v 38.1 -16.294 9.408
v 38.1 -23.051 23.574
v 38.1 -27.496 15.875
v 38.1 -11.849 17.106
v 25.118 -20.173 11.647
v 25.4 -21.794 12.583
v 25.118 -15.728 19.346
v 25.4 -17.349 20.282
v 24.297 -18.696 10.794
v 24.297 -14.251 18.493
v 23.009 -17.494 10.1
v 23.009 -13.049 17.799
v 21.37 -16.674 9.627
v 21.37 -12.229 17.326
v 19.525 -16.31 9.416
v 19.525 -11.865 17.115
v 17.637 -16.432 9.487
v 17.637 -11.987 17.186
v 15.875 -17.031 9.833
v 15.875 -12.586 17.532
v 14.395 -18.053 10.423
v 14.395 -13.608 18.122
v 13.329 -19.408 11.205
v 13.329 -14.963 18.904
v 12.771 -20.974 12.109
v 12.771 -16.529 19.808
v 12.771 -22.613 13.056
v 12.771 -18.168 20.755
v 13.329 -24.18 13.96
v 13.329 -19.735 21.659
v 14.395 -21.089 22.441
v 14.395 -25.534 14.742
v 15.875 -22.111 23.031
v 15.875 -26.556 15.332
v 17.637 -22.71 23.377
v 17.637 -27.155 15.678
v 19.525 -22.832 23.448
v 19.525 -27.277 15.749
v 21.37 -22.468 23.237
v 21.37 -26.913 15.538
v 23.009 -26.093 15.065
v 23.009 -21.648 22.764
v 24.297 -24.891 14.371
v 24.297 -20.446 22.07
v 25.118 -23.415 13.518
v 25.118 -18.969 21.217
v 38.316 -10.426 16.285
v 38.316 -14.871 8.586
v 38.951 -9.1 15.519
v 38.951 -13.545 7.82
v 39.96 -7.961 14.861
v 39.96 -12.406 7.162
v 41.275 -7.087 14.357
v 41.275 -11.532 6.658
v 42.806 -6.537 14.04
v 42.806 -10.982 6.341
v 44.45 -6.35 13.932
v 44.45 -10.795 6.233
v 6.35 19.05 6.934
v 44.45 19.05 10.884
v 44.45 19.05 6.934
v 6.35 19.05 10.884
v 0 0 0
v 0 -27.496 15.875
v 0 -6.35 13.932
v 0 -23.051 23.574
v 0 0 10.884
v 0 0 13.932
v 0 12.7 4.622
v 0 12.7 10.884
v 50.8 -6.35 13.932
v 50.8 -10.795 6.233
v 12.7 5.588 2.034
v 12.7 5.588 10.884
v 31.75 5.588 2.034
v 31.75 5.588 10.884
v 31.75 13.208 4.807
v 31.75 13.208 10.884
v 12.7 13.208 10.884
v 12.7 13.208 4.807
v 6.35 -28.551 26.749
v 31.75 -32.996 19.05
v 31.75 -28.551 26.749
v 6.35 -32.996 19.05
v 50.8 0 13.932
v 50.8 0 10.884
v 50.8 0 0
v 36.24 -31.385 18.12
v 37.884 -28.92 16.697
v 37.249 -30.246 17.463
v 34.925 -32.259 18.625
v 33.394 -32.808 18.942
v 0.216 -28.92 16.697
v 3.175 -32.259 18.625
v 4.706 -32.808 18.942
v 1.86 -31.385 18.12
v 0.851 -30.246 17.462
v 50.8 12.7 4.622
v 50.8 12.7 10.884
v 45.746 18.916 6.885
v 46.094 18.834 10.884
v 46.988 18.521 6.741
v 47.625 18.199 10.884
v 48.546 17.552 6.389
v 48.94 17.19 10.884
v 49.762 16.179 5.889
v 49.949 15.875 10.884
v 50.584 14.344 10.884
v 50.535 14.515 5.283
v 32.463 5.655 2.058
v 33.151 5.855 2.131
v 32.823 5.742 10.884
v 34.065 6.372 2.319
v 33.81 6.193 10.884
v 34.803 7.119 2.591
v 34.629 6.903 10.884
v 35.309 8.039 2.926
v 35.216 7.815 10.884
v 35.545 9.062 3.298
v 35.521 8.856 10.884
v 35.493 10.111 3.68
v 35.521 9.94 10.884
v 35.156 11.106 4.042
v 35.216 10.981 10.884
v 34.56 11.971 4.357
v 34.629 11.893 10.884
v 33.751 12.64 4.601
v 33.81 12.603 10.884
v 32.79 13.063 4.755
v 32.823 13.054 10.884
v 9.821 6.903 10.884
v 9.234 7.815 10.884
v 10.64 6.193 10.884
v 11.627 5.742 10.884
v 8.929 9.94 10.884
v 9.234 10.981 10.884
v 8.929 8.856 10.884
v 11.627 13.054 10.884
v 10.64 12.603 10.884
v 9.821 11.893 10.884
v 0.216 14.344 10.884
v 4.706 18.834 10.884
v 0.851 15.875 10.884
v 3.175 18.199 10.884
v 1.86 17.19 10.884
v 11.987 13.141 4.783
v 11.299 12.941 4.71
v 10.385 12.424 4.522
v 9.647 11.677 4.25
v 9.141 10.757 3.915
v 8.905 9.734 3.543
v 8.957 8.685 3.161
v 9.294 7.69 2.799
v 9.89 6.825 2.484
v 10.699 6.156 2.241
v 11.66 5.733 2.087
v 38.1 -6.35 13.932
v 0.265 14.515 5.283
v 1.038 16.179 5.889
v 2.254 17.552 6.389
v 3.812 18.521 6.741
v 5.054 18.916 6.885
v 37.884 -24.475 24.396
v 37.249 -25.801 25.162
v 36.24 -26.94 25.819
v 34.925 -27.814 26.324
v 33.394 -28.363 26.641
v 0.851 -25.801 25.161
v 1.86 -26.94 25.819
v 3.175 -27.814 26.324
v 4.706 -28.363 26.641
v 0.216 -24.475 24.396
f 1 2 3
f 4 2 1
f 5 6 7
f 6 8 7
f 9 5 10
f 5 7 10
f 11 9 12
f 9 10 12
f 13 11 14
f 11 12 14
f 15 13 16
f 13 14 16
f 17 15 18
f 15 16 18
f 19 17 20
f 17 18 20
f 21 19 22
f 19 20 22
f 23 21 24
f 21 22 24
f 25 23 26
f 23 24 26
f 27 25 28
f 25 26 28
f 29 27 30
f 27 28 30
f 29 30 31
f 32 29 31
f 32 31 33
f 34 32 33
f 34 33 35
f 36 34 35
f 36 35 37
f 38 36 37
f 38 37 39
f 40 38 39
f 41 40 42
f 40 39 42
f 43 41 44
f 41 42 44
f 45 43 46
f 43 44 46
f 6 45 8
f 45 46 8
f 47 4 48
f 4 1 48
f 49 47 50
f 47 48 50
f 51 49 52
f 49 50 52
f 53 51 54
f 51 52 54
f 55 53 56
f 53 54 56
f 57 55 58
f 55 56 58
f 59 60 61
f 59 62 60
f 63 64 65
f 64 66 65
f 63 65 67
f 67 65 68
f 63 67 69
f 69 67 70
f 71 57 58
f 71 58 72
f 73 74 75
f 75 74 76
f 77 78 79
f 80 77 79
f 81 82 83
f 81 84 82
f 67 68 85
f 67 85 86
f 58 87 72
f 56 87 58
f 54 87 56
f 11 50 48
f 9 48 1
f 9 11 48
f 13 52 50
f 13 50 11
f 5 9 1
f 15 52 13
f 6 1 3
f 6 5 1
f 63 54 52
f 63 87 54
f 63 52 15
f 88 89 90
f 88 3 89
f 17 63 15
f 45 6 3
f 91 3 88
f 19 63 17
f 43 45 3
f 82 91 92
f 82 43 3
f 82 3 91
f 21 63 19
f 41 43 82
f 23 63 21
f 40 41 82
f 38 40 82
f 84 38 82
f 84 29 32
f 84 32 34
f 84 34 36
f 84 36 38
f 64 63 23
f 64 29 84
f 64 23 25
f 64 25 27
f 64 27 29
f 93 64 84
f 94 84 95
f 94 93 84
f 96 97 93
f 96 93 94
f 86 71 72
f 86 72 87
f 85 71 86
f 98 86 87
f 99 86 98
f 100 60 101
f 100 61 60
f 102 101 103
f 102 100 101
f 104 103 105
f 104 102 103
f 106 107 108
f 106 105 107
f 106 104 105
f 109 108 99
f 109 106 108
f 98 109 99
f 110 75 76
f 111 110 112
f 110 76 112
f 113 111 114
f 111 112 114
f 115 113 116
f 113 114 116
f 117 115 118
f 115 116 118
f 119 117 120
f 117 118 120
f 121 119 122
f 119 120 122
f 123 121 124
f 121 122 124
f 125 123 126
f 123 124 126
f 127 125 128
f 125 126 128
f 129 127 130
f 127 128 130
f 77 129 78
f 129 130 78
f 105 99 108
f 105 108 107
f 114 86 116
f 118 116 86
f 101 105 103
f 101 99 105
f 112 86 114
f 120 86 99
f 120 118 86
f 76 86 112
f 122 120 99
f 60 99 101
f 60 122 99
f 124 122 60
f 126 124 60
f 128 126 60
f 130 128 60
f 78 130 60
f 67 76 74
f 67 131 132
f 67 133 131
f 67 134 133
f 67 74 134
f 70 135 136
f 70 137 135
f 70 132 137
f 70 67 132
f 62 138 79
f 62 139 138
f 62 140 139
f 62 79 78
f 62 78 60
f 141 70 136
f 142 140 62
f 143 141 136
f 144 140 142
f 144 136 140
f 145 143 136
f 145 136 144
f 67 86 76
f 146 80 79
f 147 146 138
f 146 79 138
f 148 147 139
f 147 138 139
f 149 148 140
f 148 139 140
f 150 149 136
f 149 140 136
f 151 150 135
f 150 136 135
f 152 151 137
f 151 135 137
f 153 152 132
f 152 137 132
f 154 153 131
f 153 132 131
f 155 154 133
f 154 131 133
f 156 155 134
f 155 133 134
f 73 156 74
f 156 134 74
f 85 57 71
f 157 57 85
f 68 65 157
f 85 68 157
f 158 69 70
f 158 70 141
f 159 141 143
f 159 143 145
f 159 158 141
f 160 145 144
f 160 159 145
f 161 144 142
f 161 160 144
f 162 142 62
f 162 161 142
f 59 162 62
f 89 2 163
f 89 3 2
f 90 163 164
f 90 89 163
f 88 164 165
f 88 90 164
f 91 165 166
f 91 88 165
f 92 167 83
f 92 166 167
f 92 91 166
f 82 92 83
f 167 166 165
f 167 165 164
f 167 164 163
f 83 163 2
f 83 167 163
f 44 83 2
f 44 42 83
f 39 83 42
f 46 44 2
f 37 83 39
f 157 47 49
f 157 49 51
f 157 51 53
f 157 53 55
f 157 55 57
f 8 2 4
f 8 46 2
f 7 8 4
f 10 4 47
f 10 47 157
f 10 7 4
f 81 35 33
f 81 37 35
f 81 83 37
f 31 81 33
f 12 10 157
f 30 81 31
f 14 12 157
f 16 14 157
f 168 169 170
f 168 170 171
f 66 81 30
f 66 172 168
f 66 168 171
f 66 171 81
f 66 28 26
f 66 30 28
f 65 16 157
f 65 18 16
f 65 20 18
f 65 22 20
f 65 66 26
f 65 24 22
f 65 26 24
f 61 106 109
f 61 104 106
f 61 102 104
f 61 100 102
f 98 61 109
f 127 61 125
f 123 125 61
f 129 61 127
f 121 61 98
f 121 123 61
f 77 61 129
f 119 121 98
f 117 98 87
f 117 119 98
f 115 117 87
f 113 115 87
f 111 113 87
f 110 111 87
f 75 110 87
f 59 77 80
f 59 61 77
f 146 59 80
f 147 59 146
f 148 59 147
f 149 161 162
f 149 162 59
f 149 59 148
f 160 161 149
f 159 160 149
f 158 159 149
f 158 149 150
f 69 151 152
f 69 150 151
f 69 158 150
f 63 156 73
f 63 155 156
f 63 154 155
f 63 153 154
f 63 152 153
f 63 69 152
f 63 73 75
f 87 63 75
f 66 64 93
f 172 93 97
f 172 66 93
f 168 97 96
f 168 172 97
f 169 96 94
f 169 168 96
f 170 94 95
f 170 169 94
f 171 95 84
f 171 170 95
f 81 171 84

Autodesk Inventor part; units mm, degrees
ref_plane "YZ Plane" through (0, 0, 0) normal (1, 0, 0) x (0, 1, 0)
ref_plane "XZ Plane" through (0, 0, 0) normal (0, 1, 0) x (-1, 0, 0)
ref_plane "XY Plane" through (0, 0, 0) normal (0, 0, 1) x (1, 0, 0)
sketch "Sketch1" plane through (0, 0, 0) normal (1, 0, 0) x (0, 1, 0)
  line L0 (0, 0) -> (-32.9956, 19.05)
  line L1 (-32.9956, 19.05) -> (-28.5506, 26.749)
  line L2 (-28.5506, 26.749) -> (-6.35, 13.9315)
  line L3 (-6.35, 13.9315) -> (0, 13.9315)
  line L4 (0, 13.9315) -> (0, 10.8835)
  line L5 (0, 10.8835) -> (19.05, 10.8835)
  line L6 (19.05, 10.8835) -> (19.05, 6.9336)
  line L7 (19.05, 6.9336) -> (0, 0)
  dimension "d0" = 38.1
  dimension "d1" = 8.89
  dimension "d2" = 30
  dimension "d3" = 19.05
  dimension "d5" = 3.048
  dimension "d6" = 20
  dimension "d7" = 6.35
extrude "MAIN BODY" add sketch "Sketch1" along normal blind 50.8
sketch "Sketch2" plane through (0, 0, 10.8835) normal (0, 0, 1) x (1, 0, 0)
  line L0 (12.7, 9.398) -> (31.75, 9.398) construction
  line L1 (12.7, 5.588) -> (31.75, 5.588)
  line L2 (31.75, 13.208) -> (12.7, 13.208)
  arc A0 (12.7, 13.208) -> (12.7, 5.588) centre (12.7, 9.398) ccw
  arc A1 (31.75, 5.588) -> (31.75, 13.208) centre (31.75, 9.398) ccw
  line L3 (0, 19.05) -> (0, 0) projected
  line L4 (0, 19.05) -> (50.8, 19.05) projected
  line L5 (0, 0) -> (50.8, 0) projected
  point P0 (22.225, 9.398)
  dimension "d11" = 7.62
  dimension "d12" = 19.05
  dimension "d13" = 12.7
  dimension "d15" = 9.398
extrude "SLOT CUTOUT" cut sketch "Sketch2" against normal through all
sketch "Sketch3" plane through (0, -28.5506, 26.749) normal (0, 0.5, 0.8660254) x (1, 0, 0)
  circle A0 centre (19.05, 12.935) radius 6.35
  line L0 (38.1, 25.635) -> (50.8, 25.635)
  line L1 (50.8, 25.635) -> (50.8, 0)
  line L2 (50.8, 0) -> (38.1, 0)
  line L3 (38.1, 0) -> (38.1, 25.635)
  line L4 (0, 25.635) -> (0, 0) projected
  line L5 (0, 25.635) -> (50.8, 25.635) projected
  line L6 (50.8, 25.635) -> (50.8, 0) projected
  line L7 (0, 0) -> (50.8, 0) projected
  point P0 (0, 38.1)
  dimension "d18" = 12.7
  dimension "d19" = 19.05
  dimension "d20" = 12.7
  dimension "d21" = 38.1
extrude "CIRC AND RECT CUTOUT" cut sketch "Sketch3" against normal through all contours A0 | L0 L1 L2 L3
fillet ".25 filliets" radius 6.35 5 edges at (50.8, 19.05, 8.9085) (0, 19.05, 8.9085) (38.1, -8.5725, 10.082) (38.1, -30.7731, 22.8995) (0, -30.7731, 22.8995)
properties part number "ANS9-2-BK" material "Polypropylene"
